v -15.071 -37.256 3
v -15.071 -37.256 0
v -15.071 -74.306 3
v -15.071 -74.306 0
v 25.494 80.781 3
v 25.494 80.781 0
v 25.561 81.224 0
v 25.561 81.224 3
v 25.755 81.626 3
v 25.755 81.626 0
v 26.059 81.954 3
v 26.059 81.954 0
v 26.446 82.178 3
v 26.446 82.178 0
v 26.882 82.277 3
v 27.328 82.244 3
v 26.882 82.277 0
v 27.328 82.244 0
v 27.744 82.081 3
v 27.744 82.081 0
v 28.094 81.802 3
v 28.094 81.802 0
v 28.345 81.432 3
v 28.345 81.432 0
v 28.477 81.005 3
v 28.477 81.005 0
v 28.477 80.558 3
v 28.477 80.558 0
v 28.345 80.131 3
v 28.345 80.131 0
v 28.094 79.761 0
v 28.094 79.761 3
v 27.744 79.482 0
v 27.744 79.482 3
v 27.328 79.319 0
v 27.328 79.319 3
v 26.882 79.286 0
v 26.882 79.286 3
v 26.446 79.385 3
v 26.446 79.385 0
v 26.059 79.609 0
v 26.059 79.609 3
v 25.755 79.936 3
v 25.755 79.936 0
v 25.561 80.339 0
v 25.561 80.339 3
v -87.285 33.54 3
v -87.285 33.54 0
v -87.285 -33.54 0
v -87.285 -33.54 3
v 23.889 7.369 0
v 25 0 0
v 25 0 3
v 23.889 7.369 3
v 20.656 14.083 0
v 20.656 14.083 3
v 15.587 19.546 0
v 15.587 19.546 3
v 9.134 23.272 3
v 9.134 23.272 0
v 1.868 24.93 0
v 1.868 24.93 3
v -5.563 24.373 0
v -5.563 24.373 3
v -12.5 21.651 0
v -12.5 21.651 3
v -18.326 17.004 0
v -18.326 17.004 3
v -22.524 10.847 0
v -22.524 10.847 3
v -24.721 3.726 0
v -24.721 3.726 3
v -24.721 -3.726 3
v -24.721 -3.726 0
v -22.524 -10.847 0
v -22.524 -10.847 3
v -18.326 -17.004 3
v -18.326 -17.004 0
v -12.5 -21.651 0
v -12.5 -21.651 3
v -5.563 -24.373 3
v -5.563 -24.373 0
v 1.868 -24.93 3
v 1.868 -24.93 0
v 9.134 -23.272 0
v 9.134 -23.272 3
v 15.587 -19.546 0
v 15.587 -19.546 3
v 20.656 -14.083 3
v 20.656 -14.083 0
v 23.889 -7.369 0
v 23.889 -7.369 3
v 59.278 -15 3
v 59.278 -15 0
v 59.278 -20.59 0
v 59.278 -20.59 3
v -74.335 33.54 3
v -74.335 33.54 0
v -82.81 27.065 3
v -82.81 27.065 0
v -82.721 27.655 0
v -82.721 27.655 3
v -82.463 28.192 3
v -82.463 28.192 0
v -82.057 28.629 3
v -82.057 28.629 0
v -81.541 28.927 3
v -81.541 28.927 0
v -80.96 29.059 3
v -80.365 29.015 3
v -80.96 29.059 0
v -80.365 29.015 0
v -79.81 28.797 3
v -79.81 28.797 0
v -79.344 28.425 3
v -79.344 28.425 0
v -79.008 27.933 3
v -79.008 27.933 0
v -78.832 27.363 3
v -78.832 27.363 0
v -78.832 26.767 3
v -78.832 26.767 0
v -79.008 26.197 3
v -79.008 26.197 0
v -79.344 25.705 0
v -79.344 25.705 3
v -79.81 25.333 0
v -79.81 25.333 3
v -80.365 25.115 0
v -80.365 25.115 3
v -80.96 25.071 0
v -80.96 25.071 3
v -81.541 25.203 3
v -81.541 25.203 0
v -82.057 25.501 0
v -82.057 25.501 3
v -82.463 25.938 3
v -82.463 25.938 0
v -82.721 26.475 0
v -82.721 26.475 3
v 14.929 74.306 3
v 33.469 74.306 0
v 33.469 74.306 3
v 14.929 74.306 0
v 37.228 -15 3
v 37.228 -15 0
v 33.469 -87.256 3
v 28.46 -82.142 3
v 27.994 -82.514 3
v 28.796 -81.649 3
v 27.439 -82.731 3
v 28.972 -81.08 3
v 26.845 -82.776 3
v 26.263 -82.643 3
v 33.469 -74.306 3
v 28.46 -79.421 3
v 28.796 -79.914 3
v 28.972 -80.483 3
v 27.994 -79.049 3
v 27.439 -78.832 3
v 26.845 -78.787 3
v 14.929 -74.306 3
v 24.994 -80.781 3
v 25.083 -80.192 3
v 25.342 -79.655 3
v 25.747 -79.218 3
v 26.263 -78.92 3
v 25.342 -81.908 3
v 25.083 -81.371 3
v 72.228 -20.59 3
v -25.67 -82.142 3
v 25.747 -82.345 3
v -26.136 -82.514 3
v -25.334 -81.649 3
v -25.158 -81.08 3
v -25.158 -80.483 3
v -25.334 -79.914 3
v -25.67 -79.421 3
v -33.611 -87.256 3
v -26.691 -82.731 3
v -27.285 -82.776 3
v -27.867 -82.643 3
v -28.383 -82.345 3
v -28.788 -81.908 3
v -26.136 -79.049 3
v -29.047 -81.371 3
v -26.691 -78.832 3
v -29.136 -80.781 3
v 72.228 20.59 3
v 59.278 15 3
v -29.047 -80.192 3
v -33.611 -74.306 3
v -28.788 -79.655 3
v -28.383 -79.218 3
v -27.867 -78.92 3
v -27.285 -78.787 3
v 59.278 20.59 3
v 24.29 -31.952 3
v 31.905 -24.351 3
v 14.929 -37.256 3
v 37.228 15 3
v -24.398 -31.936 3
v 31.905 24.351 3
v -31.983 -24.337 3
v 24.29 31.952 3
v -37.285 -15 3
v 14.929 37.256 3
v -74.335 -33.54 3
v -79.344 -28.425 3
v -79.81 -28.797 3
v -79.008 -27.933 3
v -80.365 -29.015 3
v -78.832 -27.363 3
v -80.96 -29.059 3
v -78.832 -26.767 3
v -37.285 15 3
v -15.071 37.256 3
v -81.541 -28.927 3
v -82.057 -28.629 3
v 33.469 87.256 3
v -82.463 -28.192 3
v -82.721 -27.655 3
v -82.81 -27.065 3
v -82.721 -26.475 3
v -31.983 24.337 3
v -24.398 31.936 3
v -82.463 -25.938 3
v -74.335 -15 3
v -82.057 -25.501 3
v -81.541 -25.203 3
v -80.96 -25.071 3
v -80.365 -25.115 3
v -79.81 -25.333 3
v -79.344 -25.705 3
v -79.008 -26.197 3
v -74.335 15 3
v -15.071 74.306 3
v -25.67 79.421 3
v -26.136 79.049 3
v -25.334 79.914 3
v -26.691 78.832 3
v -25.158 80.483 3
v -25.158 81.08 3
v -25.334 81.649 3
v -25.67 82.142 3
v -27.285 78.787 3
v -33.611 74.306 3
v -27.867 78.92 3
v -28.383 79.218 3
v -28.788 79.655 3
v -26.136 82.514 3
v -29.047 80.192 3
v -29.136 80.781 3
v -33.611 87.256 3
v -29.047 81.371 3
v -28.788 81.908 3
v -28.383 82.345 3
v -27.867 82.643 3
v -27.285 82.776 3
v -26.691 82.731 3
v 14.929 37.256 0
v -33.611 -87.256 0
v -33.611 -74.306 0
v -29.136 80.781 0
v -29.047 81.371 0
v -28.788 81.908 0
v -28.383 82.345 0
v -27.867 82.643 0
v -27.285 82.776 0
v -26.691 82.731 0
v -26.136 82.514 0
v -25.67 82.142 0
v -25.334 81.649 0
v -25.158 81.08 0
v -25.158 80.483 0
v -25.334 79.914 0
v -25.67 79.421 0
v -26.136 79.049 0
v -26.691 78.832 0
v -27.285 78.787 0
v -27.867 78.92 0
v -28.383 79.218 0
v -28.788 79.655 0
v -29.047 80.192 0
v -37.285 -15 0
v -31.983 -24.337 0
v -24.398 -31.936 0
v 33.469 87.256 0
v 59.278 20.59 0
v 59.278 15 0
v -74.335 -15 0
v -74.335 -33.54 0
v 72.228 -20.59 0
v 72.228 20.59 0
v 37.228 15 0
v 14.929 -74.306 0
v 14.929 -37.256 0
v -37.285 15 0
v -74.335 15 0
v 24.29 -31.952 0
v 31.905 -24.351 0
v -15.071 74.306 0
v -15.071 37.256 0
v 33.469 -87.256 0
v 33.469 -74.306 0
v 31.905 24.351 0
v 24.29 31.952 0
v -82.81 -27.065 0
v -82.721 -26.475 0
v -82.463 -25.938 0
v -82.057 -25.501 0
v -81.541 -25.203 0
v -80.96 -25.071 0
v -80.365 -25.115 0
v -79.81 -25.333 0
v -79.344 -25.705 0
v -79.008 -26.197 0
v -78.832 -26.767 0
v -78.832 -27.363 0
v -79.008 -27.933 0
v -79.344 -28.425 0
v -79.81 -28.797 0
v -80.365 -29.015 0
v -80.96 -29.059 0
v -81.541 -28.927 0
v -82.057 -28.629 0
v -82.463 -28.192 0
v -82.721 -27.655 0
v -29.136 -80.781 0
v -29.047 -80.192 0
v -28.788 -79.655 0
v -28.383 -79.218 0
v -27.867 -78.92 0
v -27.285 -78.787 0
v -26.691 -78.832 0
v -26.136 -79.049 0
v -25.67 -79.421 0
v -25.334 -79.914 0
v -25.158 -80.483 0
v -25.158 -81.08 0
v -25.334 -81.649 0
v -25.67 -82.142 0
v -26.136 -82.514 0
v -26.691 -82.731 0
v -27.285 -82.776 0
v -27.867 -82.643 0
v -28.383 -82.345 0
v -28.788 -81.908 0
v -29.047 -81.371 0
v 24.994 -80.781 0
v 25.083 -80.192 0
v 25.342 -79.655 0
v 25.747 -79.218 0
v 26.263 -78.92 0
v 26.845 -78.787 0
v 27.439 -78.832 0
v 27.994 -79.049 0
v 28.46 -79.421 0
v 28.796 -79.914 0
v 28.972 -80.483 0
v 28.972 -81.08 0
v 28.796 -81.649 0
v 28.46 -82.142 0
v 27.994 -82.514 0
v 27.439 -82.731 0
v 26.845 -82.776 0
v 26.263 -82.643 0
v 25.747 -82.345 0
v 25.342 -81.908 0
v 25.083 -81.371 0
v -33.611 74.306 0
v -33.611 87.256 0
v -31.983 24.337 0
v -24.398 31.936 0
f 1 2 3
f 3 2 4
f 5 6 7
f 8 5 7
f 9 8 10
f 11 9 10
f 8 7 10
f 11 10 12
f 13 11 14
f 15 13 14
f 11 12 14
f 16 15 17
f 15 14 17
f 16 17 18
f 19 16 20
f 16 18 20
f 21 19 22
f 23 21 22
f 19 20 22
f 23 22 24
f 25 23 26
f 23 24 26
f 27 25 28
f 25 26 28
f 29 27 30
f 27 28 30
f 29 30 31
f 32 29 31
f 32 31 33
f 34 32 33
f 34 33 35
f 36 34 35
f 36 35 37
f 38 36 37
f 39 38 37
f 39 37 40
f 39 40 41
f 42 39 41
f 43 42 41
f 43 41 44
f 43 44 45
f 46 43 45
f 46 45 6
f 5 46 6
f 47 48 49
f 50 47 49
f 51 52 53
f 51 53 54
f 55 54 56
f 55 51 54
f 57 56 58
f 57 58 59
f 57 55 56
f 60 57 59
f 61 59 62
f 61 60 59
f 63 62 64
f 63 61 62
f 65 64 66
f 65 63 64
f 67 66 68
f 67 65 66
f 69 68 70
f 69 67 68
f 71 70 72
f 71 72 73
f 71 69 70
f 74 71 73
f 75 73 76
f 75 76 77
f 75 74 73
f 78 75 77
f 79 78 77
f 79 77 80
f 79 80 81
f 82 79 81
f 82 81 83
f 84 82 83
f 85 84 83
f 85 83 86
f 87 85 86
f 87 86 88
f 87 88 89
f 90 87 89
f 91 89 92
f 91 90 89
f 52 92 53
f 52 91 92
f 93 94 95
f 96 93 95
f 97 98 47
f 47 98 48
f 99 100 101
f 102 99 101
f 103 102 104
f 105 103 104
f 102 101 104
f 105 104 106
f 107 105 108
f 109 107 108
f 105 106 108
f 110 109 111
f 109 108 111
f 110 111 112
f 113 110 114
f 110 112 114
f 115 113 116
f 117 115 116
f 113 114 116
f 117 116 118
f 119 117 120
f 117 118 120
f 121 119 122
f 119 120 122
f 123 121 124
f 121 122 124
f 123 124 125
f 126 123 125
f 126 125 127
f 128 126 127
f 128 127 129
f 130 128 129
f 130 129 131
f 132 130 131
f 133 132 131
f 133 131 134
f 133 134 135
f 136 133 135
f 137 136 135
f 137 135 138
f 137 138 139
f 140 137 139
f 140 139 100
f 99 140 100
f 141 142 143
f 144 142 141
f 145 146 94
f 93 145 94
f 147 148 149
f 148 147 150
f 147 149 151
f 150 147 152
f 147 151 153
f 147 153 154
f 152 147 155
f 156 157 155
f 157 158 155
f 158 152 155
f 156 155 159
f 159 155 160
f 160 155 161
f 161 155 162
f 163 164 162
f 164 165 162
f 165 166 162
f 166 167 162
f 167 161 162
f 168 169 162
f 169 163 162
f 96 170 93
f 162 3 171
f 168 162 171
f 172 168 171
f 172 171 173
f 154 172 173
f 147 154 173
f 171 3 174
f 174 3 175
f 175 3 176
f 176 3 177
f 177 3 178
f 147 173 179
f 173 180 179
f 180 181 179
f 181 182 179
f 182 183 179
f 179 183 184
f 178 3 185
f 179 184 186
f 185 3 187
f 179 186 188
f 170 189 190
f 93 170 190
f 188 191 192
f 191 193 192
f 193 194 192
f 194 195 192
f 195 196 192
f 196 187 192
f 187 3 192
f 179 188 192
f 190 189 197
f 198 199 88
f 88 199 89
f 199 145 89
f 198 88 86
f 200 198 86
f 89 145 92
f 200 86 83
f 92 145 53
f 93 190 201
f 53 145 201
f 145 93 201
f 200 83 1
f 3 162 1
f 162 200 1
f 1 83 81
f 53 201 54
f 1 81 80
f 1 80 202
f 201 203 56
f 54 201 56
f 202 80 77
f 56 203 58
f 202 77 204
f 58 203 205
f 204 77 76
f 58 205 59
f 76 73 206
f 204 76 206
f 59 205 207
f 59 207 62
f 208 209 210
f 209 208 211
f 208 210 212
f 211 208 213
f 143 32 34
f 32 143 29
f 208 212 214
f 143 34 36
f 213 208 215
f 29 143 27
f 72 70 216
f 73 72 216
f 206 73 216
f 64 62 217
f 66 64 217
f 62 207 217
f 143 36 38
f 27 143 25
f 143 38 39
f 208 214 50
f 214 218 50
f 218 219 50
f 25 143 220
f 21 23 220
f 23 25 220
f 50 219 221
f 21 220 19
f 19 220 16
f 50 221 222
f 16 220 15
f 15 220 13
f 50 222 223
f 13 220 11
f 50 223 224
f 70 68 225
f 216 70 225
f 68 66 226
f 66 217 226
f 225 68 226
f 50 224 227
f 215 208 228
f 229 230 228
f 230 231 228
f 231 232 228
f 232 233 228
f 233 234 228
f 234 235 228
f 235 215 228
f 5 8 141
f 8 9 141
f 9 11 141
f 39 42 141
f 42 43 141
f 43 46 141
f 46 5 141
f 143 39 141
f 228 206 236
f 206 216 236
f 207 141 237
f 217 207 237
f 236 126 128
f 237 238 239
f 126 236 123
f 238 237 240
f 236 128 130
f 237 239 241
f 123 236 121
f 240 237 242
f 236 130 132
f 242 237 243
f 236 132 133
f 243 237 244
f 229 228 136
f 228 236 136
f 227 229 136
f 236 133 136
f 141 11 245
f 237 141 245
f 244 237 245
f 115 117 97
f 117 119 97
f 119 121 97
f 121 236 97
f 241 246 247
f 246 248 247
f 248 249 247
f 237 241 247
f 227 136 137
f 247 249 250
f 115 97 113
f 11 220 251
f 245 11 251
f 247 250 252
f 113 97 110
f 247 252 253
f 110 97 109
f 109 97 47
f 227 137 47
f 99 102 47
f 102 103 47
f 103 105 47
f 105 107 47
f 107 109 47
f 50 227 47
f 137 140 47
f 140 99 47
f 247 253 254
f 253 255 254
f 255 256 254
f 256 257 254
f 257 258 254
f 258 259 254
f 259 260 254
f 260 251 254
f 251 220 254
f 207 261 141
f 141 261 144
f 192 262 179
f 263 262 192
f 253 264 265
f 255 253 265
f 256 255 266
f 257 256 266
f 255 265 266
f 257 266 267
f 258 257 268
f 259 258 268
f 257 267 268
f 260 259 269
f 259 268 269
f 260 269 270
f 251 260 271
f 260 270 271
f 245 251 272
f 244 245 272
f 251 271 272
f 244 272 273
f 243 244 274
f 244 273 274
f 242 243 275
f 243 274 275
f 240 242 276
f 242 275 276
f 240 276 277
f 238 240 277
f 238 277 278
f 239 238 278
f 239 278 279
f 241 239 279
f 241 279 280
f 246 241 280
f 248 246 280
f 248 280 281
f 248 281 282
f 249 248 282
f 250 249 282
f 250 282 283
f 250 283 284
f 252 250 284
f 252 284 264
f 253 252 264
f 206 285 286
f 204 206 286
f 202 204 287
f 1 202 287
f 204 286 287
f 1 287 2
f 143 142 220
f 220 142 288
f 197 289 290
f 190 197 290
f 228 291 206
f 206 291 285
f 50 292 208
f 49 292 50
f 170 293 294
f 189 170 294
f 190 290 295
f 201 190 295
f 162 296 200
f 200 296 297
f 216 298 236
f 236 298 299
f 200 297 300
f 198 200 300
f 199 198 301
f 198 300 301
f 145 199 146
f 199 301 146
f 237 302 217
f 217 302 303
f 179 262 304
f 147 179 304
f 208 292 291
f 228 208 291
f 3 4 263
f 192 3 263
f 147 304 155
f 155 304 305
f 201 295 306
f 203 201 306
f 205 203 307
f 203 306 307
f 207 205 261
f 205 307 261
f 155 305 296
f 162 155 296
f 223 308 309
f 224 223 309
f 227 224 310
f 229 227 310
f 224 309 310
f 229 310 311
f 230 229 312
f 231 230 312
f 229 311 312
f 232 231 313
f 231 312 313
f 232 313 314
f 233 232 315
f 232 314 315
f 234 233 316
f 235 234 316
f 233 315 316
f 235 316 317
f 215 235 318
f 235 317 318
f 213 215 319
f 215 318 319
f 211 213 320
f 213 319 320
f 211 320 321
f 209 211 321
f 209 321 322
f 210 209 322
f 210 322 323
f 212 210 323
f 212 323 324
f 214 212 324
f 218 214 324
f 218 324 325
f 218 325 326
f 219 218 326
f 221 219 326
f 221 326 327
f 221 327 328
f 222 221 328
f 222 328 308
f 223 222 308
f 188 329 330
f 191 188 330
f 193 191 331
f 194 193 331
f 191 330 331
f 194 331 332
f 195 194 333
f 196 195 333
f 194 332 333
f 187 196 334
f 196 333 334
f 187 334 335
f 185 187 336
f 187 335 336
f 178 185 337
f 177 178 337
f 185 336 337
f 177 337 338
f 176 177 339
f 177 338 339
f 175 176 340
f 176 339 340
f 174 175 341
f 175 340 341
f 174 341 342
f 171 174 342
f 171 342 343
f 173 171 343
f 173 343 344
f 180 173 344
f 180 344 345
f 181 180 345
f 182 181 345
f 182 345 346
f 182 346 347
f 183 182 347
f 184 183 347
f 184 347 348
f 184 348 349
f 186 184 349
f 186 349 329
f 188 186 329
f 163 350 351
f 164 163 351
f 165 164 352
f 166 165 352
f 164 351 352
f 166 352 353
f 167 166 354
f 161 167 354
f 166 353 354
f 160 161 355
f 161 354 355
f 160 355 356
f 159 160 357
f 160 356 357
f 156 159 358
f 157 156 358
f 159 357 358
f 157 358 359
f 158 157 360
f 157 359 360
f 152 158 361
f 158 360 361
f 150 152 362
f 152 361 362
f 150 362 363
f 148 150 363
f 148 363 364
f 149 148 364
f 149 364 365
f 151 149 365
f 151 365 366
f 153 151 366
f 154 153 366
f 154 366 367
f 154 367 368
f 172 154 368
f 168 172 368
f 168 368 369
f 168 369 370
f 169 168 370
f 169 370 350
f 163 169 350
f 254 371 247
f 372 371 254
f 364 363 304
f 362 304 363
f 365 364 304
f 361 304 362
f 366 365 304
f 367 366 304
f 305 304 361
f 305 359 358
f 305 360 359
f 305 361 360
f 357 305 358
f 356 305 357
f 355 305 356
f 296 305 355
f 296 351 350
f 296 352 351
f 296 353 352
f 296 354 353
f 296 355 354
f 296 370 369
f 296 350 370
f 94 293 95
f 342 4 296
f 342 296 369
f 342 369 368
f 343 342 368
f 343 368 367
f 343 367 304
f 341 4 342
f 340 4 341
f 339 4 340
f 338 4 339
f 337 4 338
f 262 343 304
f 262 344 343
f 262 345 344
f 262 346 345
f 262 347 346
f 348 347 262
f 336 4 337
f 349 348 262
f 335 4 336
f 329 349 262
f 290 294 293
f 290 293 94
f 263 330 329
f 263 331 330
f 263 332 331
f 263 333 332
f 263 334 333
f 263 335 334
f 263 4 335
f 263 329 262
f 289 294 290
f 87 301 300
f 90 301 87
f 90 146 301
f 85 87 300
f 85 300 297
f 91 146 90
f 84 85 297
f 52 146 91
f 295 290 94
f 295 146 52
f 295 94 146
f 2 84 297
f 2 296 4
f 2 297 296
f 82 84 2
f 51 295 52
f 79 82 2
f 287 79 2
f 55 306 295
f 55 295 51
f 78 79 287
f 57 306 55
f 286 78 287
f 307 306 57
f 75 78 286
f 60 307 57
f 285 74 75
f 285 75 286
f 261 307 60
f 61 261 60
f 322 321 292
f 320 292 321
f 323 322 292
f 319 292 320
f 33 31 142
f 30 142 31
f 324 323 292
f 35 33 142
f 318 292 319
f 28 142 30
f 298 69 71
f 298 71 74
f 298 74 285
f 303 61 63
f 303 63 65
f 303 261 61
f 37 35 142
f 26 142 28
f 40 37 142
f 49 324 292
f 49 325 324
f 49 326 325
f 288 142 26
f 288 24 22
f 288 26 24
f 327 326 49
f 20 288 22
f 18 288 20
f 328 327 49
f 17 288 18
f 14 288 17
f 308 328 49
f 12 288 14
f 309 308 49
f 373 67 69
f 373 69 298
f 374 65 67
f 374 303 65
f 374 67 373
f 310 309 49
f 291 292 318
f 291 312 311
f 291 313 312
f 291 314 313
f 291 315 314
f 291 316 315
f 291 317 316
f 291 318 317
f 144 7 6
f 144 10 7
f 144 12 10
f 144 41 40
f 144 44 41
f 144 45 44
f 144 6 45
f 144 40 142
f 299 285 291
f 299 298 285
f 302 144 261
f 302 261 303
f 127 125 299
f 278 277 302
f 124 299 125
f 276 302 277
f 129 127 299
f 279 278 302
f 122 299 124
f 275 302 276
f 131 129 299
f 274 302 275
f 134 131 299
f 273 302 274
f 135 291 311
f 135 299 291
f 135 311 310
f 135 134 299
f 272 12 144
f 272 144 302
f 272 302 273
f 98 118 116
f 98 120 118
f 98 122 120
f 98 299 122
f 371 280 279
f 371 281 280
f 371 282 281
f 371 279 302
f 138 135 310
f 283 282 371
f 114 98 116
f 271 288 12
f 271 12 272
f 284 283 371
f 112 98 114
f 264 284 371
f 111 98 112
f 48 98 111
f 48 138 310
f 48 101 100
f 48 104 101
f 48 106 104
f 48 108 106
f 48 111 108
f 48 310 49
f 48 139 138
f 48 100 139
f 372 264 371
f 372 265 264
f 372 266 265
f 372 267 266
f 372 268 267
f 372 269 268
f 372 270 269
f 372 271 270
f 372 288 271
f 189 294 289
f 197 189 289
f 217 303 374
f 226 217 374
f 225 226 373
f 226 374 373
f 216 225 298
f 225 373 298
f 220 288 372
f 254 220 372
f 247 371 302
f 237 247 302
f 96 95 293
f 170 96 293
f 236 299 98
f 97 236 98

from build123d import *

# Parameters (mm, degrees)
CROQUIS1_R              = 25
SALIENTE_EXTRUIR1_DEPTH = 3
CROQUIS2_W              = 12.95
CROQUIS2_H              = 12.95
SALIENTE_EXTRUIR2_DEPTH = 3
CROQUIS3_R              = 1.5
CROQUIS3_R_2            = 2
CORTAR_EXTRUIR1_DEPTH   = 124.455998815


with BuildPart() as part:
    # Croquis1 → Saliente-Extruir1 (new body)
    with BuildSketch(Plane.XY):
        with BuildLine():
            Line((-15.070986718, 74.306476298), (-15.070986718, 37.256476298))
            ThreePointArc((-15.070986718, 37.256476298), (-28.445175059, 28.391049341), (-37.285113206, 15))
            Line((-37.285113206, 15), (-74.335113206, 15))
            Line((-74.335113206, 15), (-74.335113206, 20.59))
            Line((-74.335113206, 20.59), (-87.285113206, 20.59))
            Line((-87.285113206, 20.59), (-87.285113206, -20.59))
            Line((-87.285113206, -20.59), (-74.335113206, -20.59))
            Line((-74.335113206, -20.59), (-74.335113206, -15))
            Line((-74.335113206, -15), (-37.285113206, -15))
            ThreePointArc((-37.285113206, -15), (-28.445175059, -28.391049341), (-15.070986718, -37.256476298))
            Line((-15.070986718, -37.256476298), (-15.070986718, -74.306476298))
            Line((-15.070986718, -74.306476298), (-20.660986718, -74.306476298))
            Line((-20.660986718, -74.306476298), (-20.660986718, -87.256476298))
            Line((-20.660986718, -87.256476298), (20.519013282, -87.256476298))
            Line((20.519013282, -87.256476298), (20.519013282, -74.306476298))
            Line((20.519013282, -74.306476298), (14.929013282, -74.306476298))
            Line((14.929013282, -74.306476298), (14.929013282, -37.256476298))
            ThreePointArc((14.929013282, -37.256476298), (28.353570497, -28.407666286), (37.22795272, -15))
            Line((37.22795272, -15), (59.27795272, -15))
            Line((59.27795272, -15), (59.27795272, -20.59))
            Line((59.27795272, -20.59), (72.22795272, -20.59))
            Line((72.22795272, -20.59), (72.22795272, 20.59))
            Line((72.22795272, 20.59), (59.27795272, 20.59))
            Line((59.27795272, 20.59), (59.27795272, 15))
            Line((59.27795272, 15), (37.22795272, 15))
            ThreePointArc((37.22795272, 15), (28.353570497, 28.407666286), (14.929013282, 37.256476298))
            Line((14.929013282, 37.256476298), (14.929013282, 74.306476298))
            Line((14.929013282, 74.306476298), (20.519013282, 74.306476298))
            Line((20.519013282, 74.306476298), (20.519013282, 87.256476298))
            Line((20.519013282, 87.256476298), (-20.660986718, 87.256476298))
            Line((-20.660986718, 87.256476298), (-20.660986718, 74.306476298))
            Line((-20.660986718, 74.306476298), (-15.070986718, 74.306476298))
        make_face()
        Circle(CROQUIS1_R, mode=Mode.SUBTRACT)
    extrude(amount=SALIENTE_EXTRUIR1_DEPTH)

    # Croquis2 → Saliente-Extruir2 (add)
    with BuildSketch(Plane(origin=(0, 0, 0), x_dir=(-1, 0, 0), z_dir=(0, 0, -1))):
        with Locations((-26.994013282, 80.781476298)):
            Rectangle(CROQUIS2_W, CROQUIS2_H)
        with Locations((27.135986718, 80.781476298)):
            Rectangle(CROQUIS2_W, CROQUIS2_H)
        with Locations((-26.994013282, -80.781476298)):
            Rectangle(CROQUIS2_W, CROQUIS2_H)
        with Locations((27.135986718, -80.781476298)):
            Rectangle(CROQUIS2_W, CROQUIS2_H)
        with Locations((80.810113206, 27.065)):
            Rectangle(CROQUIS2_W, CROQUIS2_H)
        with Locations((80.810113206, -27.065)):
            Rectangle(CROQUIS2_W, CROQUIS2_H)
    extrude(amount=-SALIENTE_EXTRUIR2_DEPTH)

    # Croquis3 → Cortar-Extruir1 (cut, through all)
    with BuildSketch(Plane(origin=(0, 0, 0), x_dir=(-1, 0, 0), z_dir=(0, 0, -1))):
        with Locations((-26.994013282, 80.781476298)):
            Circle(CROQUIS3_R)
        with Locations((27.135986718, 80.781476298)):
            Circle(CROQUIS3_R_2)
        with Locations((27.135986718, -80.781476298)):
            Circle(CROQUIS3_R_2)
        with Locations((-26.994013282, -80.781476298)):
            Circle(CROQUIS3_R_2)
        with Locations((80.810113206, -27.065)):
            Circle(CROQUIS3_R_2)
        with Locations((80.810113206, 27.065)):
            Circle(CROQUIS3_R_2)
    extrude(amount=-CORTAR_EXTRUIR1_DEPTH, mode=Mode.SUBTRACT)


solid = part.part
